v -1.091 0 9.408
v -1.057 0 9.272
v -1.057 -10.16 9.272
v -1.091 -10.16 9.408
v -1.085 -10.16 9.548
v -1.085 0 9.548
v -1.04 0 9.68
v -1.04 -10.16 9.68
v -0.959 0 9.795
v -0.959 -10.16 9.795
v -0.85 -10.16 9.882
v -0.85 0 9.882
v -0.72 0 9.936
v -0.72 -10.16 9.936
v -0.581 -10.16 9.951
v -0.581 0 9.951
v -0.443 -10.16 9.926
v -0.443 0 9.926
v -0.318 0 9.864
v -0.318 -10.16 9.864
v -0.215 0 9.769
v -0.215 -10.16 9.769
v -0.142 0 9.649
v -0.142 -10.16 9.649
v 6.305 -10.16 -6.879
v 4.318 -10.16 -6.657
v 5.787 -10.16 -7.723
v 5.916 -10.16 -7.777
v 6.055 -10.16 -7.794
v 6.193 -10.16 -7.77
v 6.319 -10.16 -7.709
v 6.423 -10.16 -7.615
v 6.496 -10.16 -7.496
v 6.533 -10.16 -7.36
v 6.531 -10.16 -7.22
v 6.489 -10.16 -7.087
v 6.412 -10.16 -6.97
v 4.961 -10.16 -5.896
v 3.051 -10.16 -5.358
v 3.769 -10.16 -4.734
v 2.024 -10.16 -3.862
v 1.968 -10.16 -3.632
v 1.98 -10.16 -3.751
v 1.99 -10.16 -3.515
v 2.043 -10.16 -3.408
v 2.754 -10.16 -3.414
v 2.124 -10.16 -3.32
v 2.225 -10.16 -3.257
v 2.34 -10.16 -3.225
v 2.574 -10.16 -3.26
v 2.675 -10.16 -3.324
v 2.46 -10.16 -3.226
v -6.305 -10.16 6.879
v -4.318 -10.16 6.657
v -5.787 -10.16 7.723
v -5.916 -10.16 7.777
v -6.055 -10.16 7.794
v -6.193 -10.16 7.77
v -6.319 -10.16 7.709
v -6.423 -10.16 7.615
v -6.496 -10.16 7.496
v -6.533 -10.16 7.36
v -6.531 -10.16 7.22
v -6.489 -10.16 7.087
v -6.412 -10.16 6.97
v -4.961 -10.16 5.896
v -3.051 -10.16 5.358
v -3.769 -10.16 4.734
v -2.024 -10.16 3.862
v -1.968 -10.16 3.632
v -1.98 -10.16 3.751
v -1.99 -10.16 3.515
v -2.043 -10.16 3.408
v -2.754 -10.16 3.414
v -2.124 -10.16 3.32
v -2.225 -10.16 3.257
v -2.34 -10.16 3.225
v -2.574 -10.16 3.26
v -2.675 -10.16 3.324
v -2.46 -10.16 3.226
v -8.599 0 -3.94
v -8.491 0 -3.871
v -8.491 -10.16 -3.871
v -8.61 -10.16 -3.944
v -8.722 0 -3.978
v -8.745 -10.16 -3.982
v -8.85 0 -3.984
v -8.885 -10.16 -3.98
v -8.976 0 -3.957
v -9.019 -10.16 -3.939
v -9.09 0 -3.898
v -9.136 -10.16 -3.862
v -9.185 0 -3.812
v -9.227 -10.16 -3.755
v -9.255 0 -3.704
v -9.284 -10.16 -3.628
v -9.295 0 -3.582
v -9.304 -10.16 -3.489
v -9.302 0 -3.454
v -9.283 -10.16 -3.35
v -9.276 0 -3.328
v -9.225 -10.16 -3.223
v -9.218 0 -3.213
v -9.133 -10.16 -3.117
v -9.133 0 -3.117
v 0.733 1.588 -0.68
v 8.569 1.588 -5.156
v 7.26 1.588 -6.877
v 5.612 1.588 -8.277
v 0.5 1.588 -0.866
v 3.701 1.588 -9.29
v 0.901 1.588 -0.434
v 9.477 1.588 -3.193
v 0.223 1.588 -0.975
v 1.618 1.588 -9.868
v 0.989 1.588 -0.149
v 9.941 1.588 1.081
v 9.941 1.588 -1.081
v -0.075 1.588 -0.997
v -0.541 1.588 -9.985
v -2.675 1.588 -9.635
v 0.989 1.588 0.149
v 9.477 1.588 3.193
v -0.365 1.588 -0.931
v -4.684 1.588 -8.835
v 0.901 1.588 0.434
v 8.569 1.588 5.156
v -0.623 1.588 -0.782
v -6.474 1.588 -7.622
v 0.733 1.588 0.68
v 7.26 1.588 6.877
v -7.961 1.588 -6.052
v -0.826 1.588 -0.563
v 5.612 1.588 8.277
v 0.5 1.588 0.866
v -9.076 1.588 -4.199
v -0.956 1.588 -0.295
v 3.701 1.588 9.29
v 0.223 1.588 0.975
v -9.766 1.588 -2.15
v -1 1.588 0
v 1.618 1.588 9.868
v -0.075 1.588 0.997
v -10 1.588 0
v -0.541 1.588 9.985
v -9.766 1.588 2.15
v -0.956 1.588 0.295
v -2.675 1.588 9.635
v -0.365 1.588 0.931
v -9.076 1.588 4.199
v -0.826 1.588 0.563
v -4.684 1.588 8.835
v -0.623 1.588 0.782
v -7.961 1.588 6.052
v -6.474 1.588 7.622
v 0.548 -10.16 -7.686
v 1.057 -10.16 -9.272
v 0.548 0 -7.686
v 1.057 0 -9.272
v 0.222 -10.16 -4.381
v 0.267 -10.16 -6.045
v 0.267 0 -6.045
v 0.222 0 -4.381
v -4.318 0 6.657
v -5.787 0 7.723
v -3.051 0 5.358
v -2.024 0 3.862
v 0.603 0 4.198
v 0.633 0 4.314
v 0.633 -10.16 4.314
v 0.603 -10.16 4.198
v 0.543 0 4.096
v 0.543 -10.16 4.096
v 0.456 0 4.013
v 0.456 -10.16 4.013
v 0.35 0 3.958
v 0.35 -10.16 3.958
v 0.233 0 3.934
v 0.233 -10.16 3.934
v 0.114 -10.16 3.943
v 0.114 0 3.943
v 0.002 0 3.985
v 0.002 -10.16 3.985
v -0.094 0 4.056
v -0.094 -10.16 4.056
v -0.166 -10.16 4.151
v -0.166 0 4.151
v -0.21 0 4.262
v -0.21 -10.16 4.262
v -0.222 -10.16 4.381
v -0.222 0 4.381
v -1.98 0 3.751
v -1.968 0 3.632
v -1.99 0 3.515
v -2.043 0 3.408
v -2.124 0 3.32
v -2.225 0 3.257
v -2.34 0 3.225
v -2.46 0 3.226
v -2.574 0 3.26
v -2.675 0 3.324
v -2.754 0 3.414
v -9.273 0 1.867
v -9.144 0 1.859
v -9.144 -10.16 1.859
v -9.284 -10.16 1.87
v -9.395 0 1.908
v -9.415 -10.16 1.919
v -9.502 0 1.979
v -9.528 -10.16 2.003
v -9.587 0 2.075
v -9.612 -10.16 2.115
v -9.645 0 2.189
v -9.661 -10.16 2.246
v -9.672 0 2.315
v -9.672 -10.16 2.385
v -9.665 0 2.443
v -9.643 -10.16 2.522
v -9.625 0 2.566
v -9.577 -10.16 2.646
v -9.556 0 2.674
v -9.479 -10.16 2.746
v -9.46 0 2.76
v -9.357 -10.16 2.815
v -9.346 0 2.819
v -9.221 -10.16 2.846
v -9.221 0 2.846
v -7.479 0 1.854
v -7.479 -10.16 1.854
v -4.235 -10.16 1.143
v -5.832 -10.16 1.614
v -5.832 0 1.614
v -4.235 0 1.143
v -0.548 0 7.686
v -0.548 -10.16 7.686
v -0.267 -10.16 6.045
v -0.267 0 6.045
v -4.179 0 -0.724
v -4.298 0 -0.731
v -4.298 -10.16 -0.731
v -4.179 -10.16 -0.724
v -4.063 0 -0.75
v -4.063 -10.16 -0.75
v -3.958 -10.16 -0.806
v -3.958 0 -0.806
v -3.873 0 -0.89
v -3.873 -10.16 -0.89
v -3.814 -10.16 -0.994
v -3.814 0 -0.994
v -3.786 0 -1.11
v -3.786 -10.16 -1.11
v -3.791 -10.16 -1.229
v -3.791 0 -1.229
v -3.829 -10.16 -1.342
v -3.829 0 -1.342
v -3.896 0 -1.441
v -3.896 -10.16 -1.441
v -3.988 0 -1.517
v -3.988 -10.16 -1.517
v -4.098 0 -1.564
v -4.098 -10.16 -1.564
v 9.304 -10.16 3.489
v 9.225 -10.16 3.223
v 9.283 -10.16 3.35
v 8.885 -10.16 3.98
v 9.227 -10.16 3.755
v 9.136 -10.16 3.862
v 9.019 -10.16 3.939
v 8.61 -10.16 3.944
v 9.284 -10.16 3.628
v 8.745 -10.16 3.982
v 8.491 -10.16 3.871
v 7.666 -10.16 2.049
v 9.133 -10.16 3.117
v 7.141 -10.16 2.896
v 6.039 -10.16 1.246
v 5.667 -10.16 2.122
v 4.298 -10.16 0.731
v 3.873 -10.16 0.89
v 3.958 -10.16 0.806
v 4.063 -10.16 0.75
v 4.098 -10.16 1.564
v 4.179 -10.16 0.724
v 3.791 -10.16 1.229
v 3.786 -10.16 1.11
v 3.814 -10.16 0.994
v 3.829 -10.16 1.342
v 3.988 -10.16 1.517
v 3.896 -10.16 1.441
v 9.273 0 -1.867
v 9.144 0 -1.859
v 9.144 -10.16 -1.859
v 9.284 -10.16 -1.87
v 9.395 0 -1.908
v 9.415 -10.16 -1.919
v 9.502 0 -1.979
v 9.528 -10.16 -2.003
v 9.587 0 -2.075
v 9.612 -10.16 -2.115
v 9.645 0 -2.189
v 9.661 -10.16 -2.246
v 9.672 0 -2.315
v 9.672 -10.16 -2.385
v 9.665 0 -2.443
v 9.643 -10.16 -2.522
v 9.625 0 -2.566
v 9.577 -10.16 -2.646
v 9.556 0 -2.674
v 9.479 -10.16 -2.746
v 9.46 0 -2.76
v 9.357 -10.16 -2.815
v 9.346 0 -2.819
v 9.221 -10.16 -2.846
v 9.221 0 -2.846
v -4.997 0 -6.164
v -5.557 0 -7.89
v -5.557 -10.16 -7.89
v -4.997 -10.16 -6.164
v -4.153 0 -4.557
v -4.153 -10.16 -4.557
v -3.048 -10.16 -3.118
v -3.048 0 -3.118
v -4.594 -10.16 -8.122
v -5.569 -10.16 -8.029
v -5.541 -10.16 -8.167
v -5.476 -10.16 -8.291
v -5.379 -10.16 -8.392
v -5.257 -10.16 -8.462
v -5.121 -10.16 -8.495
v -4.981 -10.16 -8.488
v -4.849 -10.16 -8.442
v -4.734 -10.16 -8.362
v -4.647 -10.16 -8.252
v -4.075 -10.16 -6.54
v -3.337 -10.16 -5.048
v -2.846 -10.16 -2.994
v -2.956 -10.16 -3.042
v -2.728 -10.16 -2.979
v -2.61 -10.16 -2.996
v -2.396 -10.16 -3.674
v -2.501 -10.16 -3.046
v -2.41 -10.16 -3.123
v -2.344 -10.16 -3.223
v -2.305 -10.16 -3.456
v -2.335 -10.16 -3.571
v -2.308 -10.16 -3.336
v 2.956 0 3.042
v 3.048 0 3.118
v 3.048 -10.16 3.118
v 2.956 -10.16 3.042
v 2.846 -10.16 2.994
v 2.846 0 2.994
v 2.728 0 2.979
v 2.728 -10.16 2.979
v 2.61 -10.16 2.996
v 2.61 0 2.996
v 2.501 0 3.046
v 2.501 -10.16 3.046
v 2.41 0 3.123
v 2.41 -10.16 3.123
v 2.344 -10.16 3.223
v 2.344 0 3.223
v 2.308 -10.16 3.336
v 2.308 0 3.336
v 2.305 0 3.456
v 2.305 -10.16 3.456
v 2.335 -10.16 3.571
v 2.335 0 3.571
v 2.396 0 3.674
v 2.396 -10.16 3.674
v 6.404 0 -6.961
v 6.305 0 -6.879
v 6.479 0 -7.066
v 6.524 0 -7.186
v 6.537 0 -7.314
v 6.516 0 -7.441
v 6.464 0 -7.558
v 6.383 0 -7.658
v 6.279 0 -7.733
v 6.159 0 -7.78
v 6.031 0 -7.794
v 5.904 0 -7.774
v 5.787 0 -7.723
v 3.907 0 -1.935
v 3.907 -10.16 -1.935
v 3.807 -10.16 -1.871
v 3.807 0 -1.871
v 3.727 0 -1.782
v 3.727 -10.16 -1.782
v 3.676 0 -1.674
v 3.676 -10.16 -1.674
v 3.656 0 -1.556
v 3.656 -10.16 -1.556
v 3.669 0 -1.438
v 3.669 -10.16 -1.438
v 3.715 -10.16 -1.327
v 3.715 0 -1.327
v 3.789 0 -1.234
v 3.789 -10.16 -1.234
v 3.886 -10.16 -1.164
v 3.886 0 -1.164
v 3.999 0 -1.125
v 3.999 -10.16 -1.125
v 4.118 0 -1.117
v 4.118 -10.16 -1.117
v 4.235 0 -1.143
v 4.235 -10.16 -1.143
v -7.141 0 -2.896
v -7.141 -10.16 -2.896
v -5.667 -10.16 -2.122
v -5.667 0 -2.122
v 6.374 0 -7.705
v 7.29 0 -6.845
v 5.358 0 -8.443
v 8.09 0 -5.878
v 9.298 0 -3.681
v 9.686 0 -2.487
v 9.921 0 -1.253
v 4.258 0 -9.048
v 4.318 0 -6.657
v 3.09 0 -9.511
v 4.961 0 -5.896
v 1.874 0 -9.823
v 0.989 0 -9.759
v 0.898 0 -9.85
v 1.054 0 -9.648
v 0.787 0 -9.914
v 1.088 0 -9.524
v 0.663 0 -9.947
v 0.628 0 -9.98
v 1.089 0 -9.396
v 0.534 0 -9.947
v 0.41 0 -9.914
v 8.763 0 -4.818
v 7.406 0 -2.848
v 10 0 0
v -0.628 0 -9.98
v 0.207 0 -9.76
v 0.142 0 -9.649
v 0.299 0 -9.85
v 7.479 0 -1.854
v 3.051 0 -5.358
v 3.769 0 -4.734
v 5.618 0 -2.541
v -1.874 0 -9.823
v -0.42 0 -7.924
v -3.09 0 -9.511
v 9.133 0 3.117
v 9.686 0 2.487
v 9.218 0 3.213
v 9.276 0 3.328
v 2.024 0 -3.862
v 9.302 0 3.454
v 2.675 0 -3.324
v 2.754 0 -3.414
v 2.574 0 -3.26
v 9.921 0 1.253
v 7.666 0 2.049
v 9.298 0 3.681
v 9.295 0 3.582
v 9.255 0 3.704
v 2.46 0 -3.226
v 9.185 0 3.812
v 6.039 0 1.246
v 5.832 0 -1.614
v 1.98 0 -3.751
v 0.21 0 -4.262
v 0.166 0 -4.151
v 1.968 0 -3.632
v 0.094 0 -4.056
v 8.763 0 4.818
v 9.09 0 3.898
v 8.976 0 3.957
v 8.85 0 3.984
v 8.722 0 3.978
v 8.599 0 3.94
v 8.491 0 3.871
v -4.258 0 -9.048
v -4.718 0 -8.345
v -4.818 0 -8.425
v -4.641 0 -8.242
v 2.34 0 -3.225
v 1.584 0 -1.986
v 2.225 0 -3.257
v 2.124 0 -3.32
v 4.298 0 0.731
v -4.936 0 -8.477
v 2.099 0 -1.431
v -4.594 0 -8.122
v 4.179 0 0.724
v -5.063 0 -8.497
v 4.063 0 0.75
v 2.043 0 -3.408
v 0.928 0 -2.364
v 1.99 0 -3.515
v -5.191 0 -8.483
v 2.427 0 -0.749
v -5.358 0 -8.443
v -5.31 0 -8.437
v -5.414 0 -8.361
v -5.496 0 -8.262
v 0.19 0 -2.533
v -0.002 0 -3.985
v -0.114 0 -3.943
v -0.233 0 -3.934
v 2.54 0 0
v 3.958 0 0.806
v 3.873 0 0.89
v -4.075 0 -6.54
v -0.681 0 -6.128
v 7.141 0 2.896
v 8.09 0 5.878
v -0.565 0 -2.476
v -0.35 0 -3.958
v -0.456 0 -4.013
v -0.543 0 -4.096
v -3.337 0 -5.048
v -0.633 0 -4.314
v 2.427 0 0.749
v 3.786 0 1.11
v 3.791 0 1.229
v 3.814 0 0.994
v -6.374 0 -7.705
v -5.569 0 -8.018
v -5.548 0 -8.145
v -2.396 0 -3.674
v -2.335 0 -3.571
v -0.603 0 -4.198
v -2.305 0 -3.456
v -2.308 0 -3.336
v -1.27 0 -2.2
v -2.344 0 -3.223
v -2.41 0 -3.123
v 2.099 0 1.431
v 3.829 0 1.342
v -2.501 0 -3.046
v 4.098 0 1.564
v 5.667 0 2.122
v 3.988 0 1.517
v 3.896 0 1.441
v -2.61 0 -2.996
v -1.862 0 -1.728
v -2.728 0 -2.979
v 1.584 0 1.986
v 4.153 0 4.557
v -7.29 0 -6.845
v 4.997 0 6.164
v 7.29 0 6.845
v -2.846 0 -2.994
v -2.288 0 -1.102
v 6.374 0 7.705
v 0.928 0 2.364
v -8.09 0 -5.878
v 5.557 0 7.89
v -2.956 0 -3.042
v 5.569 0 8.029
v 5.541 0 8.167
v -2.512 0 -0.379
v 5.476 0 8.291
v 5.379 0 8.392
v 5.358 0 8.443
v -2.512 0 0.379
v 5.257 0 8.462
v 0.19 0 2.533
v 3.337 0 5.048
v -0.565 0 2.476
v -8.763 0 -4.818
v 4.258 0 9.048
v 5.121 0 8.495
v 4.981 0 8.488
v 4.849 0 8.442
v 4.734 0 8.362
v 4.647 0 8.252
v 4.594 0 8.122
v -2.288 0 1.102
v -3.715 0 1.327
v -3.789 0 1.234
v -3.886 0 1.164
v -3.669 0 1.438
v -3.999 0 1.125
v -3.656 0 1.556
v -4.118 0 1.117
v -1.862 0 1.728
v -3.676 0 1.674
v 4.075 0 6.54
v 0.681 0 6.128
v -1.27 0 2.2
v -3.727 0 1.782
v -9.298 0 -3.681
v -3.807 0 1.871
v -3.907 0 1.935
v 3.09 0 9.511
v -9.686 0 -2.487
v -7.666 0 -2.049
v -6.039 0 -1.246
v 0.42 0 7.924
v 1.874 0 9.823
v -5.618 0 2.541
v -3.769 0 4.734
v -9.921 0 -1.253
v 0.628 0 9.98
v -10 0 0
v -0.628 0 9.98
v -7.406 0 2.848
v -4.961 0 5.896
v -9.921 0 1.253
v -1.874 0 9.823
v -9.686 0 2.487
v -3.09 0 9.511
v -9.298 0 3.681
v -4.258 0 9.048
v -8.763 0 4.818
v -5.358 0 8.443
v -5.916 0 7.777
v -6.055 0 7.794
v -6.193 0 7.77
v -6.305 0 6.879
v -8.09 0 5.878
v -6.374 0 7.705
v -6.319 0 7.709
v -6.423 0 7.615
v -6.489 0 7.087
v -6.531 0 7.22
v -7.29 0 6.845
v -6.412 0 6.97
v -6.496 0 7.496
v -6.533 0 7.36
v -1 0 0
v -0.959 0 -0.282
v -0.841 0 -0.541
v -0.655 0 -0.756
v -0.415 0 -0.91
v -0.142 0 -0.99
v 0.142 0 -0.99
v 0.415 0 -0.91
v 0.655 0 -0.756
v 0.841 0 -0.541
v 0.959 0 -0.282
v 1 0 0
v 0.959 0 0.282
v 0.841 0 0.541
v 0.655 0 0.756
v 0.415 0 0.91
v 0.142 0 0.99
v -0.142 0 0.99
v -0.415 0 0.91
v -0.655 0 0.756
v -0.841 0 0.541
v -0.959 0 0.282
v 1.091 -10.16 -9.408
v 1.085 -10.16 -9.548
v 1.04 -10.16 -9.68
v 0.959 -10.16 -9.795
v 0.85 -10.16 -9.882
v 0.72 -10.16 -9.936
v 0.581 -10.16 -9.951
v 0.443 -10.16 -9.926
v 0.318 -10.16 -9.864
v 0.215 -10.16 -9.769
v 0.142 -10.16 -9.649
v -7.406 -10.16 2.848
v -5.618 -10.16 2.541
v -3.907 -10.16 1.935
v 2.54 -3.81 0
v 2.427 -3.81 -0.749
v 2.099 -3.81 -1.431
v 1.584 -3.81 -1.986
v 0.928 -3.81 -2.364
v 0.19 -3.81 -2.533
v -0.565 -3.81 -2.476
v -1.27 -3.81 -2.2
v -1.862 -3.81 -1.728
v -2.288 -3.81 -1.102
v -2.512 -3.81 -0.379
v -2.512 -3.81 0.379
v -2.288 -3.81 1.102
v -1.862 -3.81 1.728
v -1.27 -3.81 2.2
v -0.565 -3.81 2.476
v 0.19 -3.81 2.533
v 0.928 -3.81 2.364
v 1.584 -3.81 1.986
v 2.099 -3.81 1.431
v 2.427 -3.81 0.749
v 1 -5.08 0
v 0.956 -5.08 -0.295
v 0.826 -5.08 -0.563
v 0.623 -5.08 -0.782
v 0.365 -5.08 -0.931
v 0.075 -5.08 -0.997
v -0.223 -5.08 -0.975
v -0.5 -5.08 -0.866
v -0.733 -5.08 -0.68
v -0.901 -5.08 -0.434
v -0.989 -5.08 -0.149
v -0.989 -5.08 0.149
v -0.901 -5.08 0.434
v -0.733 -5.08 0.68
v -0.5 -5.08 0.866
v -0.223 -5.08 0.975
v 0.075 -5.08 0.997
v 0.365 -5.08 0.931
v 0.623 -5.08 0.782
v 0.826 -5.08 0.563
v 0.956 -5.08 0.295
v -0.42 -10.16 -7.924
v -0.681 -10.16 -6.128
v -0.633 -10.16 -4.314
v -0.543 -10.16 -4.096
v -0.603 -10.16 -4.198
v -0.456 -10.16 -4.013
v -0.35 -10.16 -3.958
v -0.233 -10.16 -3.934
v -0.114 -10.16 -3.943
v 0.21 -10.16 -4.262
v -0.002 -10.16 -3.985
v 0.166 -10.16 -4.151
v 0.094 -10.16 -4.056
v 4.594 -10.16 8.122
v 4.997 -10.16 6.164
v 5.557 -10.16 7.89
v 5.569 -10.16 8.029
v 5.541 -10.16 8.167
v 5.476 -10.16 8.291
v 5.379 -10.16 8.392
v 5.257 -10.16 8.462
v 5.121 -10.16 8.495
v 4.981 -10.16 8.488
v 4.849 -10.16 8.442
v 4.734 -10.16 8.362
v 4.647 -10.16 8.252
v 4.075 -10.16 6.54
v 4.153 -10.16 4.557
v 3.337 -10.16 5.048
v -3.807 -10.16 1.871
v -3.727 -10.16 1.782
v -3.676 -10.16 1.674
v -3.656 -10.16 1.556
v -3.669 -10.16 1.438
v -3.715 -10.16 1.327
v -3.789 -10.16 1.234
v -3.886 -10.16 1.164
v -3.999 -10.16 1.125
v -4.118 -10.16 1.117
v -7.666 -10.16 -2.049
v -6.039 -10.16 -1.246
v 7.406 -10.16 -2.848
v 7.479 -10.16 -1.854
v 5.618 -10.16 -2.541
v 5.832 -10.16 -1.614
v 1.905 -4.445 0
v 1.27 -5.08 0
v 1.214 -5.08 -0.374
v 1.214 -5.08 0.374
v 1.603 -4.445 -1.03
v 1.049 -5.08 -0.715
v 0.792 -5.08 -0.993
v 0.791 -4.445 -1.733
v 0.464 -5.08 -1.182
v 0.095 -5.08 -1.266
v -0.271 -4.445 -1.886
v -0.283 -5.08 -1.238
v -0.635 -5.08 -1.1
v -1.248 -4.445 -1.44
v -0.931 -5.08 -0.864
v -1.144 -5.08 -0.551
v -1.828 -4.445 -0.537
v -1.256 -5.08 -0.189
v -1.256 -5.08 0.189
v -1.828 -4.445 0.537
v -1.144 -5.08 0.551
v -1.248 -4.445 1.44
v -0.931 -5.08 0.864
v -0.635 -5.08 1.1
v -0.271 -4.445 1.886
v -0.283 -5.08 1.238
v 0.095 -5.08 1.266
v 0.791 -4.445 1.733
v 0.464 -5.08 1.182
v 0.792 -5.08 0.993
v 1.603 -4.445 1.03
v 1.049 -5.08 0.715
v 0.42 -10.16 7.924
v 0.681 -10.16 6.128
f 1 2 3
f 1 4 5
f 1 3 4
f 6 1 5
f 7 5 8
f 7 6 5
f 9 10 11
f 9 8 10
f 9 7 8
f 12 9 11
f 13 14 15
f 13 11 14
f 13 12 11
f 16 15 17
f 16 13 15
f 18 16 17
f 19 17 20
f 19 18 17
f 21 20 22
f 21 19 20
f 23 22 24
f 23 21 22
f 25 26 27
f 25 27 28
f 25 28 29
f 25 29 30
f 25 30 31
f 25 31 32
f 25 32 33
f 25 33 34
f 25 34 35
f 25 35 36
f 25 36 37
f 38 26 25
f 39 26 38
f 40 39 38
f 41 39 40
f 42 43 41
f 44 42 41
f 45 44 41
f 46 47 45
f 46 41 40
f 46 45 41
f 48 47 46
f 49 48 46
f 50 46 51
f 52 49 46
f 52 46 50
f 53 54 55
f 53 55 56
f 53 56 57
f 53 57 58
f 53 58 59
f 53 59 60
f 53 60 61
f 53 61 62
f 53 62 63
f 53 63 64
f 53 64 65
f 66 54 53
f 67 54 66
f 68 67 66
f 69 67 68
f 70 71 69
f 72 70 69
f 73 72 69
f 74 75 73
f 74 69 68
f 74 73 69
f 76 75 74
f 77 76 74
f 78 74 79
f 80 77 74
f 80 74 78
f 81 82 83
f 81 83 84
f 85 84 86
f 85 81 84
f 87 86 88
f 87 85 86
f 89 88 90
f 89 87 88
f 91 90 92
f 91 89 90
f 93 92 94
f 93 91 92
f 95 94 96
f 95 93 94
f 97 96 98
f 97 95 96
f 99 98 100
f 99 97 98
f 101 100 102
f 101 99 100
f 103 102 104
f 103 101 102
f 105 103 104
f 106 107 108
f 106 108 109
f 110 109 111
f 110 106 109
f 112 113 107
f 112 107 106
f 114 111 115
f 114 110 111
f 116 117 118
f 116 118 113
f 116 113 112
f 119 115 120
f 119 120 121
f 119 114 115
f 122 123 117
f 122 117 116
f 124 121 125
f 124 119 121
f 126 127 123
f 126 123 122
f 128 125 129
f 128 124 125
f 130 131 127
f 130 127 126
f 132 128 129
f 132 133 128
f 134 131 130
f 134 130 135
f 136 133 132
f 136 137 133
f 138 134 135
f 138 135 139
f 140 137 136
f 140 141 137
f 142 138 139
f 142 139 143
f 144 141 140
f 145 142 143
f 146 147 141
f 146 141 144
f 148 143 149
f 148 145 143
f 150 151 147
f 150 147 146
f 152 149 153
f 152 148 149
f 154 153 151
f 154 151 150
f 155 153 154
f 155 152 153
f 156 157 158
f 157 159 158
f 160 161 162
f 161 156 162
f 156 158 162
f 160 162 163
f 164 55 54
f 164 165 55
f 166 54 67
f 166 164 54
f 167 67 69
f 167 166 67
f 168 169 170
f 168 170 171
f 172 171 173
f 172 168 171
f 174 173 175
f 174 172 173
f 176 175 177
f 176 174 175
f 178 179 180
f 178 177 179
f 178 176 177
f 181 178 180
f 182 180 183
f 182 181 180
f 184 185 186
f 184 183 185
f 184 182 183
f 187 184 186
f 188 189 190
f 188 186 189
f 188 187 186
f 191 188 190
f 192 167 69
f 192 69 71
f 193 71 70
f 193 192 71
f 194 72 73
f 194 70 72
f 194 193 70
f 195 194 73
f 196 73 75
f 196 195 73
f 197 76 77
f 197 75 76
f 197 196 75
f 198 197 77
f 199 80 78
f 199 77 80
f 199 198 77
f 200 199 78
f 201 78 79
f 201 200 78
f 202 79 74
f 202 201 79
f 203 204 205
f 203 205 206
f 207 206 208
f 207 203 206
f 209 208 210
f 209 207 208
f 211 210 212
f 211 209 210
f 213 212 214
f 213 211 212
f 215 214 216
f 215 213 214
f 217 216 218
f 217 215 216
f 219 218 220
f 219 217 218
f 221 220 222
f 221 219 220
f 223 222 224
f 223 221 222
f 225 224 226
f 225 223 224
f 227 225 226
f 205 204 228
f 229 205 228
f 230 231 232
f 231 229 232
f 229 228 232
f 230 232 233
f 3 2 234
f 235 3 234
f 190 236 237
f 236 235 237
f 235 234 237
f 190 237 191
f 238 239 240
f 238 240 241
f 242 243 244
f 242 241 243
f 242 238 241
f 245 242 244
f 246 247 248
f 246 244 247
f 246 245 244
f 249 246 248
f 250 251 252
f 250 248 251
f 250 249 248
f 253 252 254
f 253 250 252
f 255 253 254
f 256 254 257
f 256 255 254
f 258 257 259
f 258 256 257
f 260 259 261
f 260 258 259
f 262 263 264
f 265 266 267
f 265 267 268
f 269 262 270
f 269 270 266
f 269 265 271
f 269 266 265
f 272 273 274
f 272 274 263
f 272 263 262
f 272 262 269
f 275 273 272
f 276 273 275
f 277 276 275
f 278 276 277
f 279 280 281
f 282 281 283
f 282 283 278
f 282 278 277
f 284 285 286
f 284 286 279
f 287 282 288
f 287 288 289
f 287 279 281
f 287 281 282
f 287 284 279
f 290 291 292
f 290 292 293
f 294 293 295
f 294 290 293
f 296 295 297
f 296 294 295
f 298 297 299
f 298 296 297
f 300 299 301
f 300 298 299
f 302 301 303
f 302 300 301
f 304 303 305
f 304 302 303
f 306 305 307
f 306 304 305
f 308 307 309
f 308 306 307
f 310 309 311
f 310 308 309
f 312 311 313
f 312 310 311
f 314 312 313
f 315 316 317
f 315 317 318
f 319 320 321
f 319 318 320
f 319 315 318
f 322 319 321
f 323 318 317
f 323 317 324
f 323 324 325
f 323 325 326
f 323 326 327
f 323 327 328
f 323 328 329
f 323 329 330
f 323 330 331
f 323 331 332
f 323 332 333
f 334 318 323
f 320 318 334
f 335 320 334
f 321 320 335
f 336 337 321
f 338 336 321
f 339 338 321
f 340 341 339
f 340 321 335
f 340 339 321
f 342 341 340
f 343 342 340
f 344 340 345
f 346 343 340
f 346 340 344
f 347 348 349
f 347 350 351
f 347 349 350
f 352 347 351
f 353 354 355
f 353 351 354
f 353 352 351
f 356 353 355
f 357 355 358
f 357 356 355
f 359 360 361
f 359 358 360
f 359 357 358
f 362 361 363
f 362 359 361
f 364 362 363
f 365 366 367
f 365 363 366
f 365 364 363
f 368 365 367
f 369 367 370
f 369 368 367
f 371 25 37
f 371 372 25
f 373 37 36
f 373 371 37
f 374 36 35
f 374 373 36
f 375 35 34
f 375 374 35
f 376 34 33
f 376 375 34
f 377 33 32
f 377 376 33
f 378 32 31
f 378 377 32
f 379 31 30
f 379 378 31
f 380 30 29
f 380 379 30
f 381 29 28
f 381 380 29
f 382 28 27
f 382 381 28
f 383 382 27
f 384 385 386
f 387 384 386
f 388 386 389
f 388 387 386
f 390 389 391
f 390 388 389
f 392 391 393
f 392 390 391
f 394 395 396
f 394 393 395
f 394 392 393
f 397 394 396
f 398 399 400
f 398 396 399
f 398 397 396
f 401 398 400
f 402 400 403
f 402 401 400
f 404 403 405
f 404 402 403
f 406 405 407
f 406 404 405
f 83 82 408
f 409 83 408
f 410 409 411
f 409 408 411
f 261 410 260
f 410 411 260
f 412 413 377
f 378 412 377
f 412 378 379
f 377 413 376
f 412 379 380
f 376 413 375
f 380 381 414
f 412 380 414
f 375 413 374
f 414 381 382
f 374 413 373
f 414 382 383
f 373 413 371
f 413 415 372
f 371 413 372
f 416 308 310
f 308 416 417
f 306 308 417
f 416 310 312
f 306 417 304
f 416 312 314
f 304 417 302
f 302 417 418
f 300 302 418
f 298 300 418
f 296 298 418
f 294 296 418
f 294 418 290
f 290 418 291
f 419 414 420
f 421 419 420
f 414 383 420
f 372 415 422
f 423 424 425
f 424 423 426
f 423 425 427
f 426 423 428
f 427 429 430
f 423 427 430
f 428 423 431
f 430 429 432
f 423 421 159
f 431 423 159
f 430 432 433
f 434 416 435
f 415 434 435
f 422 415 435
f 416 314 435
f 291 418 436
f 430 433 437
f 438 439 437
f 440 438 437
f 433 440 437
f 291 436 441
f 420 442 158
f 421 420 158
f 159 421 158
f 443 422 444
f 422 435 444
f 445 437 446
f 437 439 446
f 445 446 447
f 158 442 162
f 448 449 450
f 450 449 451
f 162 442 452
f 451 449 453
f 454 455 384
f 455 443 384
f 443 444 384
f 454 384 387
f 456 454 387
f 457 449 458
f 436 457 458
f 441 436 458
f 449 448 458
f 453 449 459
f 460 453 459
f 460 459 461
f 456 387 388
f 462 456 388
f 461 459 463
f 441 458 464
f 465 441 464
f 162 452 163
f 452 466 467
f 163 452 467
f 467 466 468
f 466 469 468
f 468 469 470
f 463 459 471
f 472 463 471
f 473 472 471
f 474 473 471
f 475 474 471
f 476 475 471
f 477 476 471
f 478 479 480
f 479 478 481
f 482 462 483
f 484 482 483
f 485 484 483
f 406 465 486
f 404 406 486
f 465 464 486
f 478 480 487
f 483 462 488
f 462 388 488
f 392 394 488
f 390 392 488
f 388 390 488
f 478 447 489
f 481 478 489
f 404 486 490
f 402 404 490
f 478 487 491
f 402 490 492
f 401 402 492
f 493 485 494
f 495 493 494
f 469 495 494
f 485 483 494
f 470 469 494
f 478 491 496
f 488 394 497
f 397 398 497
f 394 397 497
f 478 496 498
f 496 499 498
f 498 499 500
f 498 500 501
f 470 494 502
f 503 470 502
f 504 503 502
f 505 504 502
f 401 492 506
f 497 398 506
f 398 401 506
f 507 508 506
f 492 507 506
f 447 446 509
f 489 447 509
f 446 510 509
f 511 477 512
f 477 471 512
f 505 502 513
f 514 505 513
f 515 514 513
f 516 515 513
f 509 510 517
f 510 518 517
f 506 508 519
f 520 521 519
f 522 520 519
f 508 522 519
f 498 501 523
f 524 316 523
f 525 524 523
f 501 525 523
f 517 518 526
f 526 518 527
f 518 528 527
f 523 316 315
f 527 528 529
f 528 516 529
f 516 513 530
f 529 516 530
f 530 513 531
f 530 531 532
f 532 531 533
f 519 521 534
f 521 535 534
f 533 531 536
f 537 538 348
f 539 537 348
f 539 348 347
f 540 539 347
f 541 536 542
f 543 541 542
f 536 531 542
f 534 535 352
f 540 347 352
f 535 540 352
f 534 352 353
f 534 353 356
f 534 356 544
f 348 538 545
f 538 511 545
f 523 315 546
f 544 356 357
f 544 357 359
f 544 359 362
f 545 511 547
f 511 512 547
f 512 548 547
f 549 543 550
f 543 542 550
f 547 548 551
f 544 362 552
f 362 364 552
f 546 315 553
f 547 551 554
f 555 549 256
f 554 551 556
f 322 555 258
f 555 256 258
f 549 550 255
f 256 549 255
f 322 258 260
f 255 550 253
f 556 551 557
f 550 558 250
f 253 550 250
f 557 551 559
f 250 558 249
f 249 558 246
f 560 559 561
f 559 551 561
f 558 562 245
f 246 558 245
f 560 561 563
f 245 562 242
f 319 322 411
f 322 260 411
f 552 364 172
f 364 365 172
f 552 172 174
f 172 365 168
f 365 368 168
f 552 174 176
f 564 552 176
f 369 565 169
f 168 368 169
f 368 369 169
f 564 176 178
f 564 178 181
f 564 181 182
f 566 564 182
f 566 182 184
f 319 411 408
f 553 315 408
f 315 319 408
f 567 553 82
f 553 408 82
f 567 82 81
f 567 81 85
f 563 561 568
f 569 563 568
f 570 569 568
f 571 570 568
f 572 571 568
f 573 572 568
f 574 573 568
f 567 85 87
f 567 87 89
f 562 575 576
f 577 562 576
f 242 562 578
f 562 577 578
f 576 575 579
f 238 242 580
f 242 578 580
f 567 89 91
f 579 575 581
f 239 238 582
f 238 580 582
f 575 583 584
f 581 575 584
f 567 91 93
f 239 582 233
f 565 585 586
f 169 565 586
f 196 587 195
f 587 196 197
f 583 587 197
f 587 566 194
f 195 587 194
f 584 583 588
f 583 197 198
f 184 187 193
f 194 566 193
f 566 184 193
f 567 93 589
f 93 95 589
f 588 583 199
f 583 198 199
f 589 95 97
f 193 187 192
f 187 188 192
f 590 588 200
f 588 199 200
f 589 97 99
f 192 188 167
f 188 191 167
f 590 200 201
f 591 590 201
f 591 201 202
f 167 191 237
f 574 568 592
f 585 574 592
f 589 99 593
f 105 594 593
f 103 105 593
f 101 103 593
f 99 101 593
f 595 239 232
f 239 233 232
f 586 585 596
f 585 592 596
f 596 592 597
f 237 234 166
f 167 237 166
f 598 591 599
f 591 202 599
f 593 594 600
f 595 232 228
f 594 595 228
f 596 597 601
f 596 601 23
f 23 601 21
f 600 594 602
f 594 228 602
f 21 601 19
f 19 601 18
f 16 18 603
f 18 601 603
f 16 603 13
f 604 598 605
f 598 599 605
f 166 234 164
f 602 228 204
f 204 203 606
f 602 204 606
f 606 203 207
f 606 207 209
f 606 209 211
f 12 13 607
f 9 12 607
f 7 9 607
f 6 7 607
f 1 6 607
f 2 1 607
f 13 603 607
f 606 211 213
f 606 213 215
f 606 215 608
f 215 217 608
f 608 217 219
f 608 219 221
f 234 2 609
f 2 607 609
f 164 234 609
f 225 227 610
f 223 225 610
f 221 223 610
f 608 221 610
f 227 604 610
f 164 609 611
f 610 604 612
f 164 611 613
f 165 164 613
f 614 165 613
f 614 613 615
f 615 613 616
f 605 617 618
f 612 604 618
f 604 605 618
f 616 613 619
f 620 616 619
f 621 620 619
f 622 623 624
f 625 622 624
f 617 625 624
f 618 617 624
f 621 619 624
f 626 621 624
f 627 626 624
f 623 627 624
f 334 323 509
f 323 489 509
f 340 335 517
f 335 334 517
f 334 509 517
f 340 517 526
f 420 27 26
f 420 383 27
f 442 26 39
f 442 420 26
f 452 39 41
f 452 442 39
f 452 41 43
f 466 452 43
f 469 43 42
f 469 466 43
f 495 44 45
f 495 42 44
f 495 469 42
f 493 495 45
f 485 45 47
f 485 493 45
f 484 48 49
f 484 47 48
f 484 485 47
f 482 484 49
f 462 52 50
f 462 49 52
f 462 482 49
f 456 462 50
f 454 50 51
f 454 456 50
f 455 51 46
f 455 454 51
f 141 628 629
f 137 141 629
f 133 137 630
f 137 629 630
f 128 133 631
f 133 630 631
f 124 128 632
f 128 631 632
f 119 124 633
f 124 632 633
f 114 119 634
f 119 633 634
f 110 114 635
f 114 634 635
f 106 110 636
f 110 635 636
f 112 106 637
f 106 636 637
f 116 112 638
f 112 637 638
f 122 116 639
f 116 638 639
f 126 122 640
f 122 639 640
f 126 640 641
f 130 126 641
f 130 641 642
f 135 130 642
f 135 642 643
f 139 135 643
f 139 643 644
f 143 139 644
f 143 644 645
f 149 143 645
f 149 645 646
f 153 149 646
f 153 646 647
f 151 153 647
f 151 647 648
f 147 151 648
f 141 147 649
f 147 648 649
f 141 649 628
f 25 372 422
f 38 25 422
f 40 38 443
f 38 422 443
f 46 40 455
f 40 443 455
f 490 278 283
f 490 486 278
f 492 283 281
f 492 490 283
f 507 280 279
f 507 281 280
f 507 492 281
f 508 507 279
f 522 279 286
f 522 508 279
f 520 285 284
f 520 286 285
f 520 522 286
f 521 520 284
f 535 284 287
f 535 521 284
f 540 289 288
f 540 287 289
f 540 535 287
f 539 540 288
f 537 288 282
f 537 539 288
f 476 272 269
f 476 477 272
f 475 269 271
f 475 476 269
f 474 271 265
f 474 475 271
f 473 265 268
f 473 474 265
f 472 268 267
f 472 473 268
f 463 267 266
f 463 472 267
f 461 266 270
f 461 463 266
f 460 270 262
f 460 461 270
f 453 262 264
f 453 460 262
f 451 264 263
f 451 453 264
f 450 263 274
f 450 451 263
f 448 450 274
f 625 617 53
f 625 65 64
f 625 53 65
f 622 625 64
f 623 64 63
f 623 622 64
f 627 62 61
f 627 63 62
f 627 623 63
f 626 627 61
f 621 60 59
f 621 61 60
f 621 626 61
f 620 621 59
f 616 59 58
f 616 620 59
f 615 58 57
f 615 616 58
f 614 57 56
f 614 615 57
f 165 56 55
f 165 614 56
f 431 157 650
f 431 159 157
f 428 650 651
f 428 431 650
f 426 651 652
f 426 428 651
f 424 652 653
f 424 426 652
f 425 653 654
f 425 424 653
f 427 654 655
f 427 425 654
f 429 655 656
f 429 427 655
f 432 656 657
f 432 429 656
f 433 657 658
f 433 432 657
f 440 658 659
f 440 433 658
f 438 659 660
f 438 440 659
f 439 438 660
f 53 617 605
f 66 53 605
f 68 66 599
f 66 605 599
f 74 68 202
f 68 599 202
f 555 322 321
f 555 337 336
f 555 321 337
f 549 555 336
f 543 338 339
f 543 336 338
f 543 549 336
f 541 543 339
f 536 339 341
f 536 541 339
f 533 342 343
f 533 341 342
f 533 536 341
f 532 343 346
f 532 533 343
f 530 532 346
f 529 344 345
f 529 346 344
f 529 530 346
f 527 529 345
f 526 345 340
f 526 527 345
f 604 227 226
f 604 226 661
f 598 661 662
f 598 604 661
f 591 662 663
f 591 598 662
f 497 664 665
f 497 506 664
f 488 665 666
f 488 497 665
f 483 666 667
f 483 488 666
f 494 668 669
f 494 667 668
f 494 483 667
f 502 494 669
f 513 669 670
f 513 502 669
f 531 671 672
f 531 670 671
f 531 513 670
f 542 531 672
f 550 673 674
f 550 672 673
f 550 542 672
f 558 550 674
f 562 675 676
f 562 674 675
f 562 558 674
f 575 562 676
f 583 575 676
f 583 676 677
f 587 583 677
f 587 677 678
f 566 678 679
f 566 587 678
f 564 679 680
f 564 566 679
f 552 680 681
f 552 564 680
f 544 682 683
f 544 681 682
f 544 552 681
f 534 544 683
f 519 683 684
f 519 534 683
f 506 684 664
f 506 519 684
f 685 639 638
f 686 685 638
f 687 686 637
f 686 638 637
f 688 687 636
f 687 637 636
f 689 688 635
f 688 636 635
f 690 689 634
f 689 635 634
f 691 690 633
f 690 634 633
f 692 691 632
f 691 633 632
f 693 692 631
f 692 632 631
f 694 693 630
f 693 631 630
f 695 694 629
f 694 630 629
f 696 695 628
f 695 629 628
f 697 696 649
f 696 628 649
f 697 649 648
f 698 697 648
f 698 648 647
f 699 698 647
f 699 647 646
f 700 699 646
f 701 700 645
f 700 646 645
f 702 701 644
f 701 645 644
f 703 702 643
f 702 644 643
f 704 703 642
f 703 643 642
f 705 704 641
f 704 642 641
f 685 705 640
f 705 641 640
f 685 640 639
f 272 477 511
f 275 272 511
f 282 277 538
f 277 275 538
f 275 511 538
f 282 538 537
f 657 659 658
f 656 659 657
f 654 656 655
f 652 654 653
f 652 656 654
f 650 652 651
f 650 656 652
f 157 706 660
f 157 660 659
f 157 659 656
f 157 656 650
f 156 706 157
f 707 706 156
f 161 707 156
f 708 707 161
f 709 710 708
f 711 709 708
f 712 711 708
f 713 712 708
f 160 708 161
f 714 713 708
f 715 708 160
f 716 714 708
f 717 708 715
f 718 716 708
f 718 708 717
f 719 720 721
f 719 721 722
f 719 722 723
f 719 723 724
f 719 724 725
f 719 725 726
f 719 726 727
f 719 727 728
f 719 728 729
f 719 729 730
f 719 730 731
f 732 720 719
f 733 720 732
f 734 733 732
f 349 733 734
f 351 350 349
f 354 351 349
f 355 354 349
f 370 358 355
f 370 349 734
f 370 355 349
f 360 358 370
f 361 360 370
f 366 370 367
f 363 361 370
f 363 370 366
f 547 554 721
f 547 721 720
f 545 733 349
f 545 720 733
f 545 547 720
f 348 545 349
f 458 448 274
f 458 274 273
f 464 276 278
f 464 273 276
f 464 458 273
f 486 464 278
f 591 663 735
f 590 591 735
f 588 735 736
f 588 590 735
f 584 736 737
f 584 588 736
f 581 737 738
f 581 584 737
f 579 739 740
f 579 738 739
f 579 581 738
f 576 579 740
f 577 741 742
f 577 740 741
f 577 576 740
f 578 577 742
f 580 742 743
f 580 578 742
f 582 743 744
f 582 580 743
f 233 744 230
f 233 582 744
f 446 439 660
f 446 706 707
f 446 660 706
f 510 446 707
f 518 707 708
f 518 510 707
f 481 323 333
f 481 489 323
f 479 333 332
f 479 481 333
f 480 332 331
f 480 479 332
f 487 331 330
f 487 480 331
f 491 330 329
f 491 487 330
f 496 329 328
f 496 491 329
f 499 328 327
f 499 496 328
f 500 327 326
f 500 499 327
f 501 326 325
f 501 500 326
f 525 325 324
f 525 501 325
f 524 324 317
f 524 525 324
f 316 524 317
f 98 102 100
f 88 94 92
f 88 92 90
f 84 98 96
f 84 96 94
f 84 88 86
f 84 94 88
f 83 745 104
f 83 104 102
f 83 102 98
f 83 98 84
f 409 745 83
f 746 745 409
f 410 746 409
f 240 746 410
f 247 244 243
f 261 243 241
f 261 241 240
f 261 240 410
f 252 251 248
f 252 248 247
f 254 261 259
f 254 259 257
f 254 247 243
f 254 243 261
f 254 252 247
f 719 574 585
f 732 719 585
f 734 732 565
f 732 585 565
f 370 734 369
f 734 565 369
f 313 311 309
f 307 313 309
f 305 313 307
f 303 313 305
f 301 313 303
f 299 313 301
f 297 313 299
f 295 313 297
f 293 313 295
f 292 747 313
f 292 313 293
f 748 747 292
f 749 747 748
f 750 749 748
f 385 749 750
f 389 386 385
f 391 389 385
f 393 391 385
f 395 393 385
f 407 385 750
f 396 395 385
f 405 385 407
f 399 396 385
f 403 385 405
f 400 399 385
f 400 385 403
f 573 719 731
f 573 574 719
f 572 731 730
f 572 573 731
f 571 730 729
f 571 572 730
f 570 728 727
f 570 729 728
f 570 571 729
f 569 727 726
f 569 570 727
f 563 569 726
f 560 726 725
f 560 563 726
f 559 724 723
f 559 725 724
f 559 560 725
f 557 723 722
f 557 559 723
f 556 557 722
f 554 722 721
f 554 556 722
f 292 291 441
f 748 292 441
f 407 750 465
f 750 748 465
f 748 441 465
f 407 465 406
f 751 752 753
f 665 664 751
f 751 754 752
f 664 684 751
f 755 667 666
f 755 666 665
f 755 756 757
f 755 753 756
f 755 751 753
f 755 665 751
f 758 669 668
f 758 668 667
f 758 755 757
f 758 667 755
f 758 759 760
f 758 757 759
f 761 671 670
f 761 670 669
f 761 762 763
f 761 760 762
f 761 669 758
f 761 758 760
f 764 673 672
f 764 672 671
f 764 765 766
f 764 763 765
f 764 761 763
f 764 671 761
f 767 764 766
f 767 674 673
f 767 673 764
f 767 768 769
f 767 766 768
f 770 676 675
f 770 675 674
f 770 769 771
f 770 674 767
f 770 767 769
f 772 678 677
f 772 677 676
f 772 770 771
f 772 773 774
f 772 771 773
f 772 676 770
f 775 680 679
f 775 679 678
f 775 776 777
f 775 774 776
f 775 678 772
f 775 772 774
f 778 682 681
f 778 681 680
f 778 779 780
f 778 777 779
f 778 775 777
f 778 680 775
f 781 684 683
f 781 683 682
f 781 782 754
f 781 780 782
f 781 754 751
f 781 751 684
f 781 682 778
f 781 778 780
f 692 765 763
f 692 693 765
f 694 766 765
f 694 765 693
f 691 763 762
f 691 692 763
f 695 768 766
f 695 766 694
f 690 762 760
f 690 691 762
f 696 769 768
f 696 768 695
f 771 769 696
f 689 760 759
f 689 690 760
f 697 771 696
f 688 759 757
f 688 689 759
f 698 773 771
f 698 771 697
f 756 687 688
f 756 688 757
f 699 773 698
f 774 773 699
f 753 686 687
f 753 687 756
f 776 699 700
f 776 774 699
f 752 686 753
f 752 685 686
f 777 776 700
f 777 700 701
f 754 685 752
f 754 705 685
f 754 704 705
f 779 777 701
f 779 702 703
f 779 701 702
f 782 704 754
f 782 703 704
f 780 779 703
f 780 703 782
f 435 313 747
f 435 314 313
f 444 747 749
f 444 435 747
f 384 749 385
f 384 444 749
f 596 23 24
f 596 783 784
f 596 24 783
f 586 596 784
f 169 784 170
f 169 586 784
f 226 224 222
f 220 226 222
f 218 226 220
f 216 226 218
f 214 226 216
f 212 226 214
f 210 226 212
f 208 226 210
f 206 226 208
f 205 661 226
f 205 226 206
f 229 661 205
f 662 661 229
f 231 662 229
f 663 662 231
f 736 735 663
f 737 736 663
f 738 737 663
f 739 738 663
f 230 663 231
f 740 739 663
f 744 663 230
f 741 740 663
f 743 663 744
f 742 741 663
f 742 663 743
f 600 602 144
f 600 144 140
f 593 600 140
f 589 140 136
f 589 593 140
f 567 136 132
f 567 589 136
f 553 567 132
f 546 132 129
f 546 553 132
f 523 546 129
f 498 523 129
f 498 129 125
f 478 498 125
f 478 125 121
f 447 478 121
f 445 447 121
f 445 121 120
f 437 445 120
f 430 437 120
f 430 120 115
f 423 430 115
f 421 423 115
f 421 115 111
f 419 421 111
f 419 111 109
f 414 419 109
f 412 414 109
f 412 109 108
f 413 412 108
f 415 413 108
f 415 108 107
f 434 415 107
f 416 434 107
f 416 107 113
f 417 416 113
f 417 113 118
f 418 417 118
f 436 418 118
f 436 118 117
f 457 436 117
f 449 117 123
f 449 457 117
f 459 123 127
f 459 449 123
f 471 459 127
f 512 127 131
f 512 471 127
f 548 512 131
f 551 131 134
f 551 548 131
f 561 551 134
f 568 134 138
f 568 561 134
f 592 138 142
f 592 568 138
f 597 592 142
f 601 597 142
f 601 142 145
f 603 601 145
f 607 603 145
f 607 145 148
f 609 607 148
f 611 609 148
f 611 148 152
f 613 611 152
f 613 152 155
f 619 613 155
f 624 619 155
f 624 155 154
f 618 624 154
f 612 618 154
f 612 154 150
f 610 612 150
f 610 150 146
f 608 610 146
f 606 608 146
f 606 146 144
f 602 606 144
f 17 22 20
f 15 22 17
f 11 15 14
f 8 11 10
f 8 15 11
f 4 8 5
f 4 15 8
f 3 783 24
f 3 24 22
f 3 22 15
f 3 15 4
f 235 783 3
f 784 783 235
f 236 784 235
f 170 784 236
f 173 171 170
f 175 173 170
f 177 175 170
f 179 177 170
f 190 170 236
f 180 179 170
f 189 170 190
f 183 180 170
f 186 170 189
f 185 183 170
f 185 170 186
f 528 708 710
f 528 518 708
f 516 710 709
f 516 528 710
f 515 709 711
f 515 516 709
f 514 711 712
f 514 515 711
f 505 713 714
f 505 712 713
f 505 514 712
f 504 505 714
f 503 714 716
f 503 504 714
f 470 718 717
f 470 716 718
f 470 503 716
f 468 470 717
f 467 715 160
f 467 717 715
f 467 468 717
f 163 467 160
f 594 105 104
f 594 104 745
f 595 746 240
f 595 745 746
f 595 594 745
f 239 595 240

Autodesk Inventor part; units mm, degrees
ref_plane "YZ Plane" through (0, 0, 0) normal (1, 0, 0) x (0, 1, 0)
ref_plane "XZ Plane" through (0, 0, 0) normal (0, 1, 0) x (-1, 0, 0)
ref_plane "XY Plane" through (0, 0, 0) normal (0, 0, 1) x (1, 0, 0)
sketch "Sketch1" plane through (0, 0, 0) normal (0, 1, 0) x (-1, 0, 0)
  circle A0 centre (0, 0) radius 10
  circle A1 centre (0, 0) radius 1
  dimension "d0" = 20
  dimension "d1" = 2
extrude "Extrusion1" add sketch "Sketch1" along normal blind 1.5875
sketch "Sketch2" plane through (0, 0, 0) normal (0, -1, 0) x (1, 0, 0)
  circle A0 centre (0, 0) radius 1
  circle A1 centre (0, 0) radius 2.54
  dimension "d4" = 5.08
extrude "Extrusion2" add sketch "Sketch2" along normal blind 5.08
sketch "Sketch3" plane through (0, 0, 0) normal (0, -1, 0) x (1, 0, 0)
  arc A0 (0.2215, -4.3806) -> (1.0574, -9.2715) centre (11.9577, -4.8916) ccw
  arc A1 (-0.6328, -4.3141) -> (0.1422, -9.6491) centre (9.9382, -5.5021) ccw
  arc A2 (0.1422, -9.6491) -> (1.0574, -9.2715) centre (0.5981, -9.4561) ccw
  arc A3 (0.2215, -4.3806) -> (-0.6328, -4.3141) centre (-0.2068, -4.362) ccw
  point P0 (0, 0)
  dimension "d7" = 1
extrude "Extrusion3" add sketch "Sketch3" along normal blind 10.16
pattern_circular "Circular Pattern1" count 10 over 360 about axis through (0, 0, 0) along (0, 1, 0) of "Extrusion3"
chamfer "Chamfer1" distance 1.27 angle 45 1 edges at (-2.54, -5.08, 0)
properties part number "Fan Blade"
